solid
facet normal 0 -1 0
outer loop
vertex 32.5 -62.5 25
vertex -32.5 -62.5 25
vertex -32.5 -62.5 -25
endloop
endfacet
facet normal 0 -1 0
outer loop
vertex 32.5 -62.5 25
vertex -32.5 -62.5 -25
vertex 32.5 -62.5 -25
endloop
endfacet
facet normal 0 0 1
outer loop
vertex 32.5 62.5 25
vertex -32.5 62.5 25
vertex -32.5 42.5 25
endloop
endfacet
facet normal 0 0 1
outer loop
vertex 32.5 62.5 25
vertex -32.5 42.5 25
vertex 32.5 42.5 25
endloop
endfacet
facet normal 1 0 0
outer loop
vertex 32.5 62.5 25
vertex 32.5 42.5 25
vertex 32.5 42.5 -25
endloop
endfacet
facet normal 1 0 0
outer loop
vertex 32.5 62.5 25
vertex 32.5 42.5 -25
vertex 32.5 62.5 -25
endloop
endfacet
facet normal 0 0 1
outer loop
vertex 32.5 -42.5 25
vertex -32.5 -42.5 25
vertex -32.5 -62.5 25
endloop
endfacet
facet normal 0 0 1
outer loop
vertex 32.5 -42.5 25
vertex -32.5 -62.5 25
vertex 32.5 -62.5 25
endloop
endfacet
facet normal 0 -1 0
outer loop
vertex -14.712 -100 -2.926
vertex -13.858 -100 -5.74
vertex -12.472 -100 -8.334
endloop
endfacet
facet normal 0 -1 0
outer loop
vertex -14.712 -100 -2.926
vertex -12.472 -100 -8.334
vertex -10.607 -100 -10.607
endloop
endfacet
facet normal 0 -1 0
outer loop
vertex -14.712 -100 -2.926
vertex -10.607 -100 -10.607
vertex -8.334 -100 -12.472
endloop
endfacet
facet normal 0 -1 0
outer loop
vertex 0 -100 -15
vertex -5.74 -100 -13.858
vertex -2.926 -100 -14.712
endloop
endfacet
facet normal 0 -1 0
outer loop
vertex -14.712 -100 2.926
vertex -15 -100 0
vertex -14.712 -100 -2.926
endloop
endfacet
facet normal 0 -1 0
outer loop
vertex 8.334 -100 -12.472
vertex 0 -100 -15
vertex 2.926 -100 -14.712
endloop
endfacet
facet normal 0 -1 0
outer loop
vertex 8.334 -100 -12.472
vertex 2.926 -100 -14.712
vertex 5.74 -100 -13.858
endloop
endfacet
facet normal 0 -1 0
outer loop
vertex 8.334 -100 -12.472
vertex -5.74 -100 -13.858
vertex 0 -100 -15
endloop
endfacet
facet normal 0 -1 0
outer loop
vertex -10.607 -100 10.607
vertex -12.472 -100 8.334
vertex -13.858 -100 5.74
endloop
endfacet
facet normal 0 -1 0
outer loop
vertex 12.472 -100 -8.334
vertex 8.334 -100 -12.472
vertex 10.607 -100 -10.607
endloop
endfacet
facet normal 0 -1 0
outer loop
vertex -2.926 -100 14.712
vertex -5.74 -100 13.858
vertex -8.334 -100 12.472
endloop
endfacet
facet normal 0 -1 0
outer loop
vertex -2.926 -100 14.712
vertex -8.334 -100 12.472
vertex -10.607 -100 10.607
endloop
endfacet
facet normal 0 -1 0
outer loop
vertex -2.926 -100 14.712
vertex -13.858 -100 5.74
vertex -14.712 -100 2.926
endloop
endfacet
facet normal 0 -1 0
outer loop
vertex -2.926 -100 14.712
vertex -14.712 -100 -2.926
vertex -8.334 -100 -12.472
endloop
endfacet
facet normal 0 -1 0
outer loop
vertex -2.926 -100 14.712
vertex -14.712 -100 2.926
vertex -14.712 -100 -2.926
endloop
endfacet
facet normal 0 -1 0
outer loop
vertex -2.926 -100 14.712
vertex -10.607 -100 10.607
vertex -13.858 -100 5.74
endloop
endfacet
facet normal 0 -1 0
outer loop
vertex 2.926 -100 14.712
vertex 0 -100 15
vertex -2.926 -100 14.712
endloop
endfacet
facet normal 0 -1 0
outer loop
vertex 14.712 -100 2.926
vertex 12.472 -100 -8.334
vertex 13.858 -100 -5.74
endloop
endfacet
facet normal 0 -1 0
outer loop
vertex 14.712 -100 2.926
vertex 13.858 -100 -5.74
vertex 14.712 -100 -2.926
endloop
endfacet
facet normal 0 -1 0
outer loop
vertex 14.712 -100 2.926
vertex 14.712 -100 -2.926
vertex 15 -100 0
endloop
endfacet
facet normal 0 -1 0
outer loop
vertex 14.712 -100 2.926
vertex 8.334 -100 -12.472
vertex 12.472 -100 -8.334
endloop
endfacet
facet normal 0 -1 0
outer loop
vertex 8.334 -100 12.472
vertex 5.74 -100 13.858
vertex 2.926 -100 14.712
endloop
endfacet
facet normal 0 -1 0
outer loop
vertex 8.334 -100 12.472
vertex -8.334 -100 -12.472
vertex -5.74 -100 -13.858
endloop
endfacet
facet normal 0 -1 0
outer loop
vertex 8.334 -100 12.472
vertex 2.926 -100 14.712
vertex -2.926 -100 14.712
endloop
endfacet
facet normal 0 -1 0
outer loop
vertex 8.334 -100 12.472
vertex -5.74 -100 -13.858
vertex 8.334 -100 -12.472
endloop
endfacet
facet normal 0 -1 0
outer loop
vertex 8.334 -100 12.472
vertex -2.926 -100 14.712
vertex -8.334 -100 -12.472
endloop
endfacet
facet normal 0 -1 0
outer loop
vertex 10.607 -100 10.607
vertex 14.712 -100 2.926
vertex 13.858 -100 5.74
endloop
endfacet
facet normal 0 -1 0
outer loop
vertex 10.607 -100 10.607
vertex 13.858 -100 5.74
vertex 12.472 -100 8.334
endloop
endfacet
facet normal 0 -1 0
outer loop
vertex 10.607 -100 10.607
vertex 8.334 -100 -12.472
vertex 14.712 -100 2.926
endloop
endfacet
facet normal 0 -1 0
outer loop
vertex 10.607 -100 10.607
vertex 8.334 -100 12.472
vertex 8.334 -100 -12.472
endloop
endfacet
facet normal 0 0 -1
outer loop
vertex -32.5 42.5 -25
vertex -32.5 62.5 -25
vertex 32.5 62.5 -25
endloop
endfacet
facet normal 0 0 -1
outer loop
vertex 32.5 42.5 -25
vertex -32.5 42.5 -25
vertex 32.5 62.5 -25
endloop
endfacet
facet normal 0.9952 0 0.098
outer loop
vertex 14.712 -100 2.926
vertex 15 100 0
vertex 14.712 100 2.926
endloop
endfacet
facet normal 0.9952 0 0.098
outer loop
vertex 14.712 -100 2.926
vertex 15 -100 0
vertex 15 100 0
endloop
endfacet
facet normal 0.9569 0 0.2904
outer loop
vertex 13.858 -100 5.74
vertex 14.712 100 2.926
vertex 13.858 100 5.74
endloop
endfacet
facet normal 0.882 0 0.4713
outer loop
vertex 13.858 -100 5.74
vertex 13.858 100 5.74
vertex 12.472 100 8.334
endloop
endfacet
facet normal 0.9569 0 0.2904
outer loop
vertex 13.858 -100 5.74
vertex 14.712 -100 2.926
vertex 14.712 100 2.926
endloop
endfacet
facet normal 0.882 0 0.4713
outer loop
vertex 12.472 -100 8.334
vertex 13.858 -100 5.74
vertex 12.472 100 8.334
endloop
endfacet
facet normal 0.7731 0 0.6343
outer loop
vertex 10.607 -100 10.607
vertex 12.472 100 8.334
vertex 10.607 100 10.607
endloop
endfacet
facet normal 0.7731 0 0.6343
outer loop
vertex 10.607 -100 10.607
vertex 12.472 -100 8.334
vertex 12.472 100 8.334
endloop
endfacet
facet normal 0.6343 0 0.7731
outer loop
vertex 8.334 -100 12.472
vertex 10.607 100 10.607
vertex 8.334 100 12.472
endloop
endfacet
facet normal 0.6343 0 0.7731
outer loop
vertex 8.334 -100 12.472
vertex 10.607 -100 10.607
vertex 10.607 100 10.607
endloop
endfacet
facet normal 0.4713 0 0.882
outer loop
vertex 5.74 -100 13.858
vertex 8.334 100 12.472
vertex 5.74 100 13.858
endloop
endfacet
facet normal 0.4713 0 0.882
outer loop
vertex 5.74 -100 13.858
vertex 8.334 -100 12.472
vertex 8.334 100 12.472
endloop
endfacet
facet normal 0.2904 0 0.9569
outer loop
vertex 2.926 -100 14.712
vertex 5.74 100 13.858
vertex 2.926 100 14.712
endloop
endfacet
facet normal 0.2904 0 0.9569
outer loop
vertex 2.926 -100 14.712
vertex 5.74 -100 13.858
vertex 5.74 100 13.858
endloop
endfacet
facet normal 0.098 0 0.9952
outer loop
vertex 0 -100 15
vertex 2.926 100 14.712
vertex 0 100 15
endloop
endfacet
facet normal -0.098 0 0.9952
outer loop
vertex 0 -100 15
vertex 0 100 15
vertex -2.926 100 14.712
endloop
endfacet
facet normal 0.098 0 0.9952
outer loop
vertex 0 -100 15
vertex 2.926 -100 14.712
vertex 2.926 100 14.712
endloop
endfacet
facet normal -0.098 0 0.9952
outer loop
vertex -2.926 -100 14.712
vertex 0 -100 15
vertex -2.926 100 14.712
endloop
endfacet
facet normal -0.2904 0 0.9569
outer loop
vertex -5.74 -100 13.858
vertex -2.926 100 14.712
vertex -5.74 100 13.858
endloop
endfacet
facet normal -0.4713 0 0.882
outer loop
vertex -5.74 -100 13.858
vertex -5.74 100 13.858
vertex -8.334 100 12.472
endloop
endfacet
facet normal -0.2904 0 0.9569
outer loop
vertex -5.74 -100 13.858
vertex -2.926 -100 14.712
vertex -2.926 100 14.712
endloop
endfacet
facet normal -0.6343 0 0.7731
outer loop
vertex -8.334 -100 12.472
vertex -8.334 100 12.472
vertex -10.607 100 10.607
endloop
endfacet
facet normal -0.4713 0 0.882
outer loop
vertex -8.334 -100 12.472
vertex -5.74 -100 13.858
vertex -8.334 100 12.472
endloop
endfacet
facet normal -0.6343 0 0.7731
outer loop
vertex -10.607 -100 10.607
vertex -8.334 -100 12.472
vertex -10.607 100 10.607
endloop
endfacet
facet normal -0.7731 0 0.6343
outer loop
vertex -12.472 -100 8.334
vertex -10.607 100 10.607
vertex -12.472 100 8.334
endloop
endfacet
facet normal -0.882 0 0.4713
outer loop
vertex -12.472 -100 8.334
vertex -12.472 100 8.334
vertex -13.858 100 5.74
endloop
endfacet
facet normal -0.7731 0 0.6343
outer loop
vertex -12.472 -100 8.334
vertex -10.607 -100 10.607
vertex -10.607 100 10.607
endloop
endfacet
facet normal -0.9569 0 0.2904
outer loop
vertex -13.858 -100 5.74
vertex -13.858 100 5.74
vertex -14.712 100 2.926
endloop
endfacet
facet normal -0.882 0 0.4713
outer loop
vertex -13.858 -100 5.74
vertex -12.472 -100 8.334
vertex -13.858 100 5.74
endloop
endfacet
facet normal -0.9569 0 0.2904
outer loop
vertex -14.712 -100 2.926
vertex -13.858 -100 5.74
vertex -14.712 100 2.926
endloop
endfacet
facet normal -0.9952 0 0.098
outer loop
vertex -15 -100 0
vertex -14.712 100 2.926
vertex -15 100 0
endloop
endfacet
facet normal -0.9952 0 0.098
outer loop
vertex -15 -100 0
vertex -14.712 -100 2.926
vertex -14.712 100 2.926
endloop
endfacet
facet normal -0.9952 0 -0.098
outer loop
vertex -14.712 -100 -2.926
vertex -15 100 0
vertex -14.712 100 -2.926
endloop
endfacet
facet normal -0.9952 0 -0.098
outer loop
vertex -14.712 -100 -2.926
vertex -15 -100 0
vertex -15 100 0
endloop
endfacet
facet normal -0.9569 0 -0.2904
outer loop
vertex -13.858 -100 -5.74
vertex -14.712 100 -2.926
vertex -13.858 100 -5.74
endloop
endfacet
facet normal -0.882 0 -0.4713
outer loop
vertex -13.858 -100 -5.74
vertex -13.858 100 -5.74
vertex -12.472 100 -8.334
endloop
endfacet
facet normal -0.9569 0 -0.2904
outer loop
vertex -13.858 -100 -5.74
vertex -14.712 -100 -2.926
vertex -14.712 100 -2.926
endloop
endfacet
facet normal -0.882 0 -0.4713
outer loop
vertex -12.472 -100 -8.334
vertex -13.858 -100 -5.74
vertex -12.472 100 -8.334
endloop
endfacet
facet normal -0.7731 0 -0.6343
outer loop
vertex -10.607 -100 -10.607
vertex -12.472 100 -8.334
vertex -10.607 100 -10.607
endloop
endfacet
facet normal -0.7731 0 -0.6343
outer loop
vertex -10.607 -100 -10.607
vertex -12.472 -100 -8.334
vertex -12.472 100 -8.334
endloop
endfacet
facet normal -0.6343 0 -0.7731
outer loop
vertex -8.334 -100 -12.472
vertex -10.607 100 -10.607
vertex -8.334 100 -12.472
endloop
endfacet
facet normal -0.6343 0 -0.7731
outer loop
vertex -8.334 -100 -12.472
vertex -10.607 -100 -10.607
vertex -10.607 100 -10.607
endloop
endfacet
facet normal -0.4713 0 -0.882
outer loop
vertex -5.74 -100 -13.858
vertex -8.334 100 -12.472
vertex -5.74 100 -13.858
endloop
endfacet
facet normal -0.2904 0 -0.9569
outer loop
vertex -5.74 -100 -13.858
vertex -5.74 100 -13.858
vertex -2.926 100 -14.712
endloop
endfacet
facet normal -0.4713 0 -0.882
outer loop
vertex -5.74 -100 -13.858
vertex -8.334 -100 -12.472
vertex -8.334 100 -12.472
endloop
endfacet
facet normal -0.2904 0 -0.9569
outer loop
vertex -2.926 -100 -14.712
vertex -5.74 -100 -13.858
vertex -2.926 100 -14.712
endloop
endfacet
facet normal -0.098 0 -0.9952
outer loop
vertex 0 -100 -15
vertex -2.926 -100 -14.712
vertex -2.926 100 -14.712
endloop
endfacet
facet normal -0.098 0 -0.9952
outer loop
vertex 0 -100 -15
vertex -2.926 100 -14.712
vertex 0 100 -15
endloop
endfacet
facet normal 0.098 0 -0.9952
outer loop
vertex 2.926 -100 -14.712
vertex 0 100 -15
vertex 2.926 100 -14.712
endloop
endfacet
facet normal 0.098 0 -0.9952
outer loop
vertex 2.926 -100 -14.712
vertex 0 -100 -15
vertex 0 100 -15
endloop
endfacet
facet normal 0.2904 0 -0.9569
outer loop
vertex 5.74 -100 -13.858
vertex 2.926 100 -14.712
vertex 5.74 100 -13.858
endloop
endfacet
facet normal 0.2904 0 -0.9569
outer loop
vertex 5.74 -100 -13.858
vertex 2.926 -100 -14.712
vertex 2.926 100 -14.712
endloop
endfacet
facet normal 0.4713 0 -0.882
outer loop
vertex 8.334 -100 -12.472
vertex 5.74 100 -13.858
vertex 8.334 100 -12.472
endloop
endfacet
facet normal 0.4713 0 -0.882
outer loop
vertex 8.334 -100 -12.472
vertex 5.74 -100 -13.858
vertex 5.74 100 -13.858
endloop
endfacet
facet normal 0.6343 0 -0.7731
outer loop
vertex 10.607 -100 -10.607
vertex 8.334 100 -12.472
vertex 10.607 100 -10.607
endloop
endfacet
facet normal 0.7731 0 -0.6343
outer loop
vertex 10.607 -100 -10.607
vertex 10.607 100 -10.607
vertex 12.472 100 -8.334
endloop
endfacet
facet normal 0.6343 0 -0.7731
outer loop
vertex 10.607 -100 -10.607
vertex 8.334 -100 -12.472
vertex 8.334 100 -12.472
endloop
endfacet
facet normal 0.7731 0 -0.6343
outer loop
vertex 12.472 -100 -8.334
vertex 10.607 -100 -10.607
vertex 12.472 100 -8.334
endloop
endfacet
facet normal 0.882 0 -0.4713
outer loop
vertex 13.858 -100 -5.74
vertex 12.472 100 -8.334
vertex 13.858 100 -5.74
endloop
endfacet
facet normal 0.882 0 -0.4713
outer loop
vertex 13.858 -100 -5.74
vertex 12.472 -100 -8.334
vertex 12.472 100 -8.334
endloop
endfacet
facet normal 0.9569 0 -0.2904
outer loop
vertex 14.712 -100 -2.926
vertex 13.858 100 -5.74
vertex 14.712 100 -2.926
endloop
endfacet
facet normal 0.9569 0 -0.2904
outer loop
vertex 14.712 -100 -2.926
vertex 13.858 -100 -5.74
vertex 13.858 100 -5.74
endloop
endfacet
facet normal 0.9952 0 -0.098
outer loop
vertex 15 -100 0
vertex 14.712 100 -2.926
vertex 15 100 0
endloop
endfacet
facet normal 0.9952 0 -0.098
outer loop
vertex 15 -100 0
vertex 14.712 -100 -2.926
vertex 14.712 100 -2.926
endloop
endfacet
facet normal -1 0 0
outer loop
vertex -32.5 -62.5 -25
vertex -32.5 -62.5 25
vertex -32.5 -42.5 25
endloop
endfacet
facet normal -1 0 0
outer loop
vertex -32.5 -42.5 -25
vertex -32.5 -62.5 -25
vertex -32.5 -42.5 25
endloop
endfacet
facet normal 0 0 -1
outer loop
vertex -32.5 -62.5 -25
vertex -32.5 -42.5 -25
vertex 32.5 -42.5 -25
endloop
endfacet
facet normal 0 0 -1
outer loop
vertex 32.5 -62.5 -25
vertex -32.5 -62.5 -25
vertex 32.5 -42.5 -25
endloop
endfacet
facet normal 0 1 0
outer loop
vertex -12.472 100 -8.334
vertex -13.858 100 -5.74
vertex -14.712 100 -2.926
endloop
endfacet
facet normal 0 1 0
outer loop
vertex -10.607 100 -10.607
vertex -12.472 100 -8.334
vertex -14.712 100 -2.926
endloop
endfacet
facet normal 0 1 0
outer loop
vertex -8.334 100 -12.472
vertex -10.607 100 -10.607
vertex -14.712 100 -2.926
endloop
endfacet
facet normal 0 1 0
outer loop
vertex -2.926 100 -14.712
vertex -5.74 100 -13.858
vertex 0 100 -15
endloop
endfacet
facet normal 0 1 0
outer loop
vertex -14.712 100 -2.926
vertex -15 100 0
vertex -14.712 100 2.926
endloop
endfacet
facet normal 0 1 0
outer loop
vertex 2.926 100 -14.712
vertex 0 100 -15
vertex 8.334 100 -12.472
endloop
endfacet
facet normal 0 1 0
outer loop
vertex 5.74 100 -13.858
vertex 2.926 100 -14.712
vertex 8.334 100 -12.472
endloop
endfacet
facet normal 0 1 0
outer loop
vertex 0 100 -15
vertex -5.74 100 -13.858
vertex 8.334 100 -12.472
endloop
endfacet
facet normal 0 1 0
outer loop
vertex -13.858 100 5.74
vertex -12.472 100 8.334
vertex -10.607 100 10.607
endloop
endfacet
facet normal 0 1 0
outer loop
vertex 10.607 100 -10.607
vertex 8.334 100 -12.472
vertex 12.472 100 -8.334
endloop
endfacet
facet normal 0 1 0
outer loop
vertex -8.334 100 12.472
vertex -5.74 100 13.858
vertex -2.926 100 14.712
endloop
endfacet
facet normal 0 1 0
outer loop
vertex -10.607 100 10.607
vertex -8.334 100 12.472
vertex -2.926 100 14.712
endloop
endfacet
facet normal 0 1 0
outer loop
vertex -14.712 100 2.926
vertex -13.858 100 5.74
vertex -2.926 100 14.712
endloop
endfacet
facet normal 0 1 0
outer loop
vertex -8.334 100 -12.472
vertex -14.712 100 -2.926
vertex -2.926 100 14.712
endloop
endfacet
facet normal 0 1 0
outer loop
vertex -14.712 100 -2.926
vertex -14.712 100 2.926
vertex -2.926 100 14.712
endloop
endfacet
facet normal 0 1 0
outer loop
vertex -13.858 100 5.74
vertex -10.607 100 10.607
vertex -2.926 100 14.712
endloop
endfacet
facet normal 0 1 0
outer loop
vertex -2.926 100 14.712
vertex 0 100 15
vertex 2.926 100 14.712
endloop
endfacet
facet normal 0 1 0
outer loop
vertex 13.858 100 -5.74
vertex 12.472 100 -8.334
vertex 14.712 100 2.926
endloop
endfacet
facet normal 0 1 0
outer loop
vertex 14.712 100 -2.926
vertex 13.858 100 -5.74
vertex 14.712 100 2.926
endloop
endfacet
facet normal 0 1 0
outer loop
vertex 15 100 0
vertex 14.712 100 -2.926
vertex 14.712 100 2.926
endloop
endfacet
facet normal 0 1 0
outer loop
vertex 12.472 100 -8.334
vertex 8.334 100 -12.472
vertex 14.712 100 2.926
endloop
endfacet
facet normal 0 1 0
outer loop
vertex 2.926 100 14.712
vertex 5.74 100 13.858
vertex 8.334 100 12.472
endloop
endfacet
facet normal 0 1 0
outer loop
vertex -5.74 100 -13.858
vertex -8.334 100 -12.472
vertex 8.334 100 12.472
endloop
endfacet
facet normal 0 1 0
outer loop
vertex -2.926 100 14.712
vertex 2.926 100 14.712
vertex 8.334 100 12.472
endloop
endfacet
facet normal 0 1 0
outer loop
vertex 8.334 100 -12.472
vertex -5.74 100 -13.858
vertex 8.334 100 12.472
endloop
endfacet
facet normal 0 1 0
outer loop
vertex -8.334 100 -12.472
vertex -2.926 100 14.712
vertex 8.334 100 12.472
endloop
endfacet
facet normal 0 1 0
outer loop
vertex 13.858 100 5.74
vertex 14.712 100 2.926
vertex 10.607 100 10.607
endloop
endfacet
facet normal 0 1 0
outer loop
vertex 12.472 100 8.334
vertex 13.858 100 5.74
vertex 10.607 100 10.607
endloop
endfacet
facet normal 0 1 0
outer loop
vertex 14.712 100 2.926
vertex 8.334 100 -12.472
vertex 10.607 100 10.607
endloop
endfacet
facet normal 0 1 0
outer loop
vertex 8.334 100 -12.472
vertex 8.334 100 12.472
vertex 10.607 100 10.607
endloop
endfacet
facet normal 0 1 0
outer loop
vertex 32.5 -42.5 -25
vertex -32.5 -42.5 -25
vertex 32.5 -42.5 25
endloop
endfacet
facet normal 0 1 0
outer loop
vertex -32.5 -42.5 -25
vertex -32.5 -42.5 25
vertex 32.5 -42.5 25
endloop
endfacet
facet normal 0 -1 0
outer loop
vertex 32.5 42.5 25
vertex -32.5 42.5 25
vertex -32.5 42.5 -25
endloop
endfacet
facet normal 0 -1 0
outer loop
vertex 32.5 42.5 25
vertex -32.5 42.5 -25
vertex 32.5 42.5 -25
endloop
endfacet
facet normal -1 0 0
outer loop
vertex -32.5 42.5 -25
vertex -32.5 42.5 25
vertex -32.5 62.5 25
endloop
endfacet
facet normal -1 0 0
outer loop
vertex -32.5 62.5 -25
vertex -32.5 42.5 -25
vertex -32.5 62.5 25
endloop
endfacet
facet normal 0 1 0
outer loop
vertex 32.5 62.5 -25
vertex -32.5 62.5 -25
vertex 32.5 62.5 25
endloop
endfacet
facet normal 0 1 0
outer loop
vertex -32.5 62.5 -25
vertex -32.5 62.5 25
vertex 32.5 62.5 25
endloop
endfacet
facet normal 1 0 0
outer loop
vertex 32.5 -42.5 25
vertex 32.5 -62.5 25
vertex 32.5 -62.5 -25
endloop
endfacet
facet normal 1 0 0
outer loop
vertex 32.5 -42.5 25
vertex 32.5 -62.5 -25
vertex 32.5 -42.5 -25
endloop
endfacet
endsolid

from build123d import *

# Parameters (mm, degrees)
F0_R          = 15
F1_DEPTH      = 100
F2_W          = 65
F2_H          = 20
F3_DEPTH      = 25
F3_DEPTH_BACK = 25


with BuildPart() as f1:
    # F0 (on Front) → F1 (new body, symmetric)
    with BuildSketch(Plane.XZ):
        Circle(F0_R)
    extrude(amount=F1_DEPTH, both=True)


with BuildPart() as f3:
    # F2 (on Top) → F3 (new body, two sides)
    with BuildSketch(Plane.XY) as f3_sk:
        with Locations((0, 52.5)):
            Rectangle(F2_W, F2_H)
        with Locations((0, -52.5)):
            Rectangle(F2_W, F2_H)
    extrude(amount=F3_DEPTH)
    extrude(f3_sk.sketch, amount=-F3_DEPTH_BACK)


solid = Compound([f1.part, f3.part])
